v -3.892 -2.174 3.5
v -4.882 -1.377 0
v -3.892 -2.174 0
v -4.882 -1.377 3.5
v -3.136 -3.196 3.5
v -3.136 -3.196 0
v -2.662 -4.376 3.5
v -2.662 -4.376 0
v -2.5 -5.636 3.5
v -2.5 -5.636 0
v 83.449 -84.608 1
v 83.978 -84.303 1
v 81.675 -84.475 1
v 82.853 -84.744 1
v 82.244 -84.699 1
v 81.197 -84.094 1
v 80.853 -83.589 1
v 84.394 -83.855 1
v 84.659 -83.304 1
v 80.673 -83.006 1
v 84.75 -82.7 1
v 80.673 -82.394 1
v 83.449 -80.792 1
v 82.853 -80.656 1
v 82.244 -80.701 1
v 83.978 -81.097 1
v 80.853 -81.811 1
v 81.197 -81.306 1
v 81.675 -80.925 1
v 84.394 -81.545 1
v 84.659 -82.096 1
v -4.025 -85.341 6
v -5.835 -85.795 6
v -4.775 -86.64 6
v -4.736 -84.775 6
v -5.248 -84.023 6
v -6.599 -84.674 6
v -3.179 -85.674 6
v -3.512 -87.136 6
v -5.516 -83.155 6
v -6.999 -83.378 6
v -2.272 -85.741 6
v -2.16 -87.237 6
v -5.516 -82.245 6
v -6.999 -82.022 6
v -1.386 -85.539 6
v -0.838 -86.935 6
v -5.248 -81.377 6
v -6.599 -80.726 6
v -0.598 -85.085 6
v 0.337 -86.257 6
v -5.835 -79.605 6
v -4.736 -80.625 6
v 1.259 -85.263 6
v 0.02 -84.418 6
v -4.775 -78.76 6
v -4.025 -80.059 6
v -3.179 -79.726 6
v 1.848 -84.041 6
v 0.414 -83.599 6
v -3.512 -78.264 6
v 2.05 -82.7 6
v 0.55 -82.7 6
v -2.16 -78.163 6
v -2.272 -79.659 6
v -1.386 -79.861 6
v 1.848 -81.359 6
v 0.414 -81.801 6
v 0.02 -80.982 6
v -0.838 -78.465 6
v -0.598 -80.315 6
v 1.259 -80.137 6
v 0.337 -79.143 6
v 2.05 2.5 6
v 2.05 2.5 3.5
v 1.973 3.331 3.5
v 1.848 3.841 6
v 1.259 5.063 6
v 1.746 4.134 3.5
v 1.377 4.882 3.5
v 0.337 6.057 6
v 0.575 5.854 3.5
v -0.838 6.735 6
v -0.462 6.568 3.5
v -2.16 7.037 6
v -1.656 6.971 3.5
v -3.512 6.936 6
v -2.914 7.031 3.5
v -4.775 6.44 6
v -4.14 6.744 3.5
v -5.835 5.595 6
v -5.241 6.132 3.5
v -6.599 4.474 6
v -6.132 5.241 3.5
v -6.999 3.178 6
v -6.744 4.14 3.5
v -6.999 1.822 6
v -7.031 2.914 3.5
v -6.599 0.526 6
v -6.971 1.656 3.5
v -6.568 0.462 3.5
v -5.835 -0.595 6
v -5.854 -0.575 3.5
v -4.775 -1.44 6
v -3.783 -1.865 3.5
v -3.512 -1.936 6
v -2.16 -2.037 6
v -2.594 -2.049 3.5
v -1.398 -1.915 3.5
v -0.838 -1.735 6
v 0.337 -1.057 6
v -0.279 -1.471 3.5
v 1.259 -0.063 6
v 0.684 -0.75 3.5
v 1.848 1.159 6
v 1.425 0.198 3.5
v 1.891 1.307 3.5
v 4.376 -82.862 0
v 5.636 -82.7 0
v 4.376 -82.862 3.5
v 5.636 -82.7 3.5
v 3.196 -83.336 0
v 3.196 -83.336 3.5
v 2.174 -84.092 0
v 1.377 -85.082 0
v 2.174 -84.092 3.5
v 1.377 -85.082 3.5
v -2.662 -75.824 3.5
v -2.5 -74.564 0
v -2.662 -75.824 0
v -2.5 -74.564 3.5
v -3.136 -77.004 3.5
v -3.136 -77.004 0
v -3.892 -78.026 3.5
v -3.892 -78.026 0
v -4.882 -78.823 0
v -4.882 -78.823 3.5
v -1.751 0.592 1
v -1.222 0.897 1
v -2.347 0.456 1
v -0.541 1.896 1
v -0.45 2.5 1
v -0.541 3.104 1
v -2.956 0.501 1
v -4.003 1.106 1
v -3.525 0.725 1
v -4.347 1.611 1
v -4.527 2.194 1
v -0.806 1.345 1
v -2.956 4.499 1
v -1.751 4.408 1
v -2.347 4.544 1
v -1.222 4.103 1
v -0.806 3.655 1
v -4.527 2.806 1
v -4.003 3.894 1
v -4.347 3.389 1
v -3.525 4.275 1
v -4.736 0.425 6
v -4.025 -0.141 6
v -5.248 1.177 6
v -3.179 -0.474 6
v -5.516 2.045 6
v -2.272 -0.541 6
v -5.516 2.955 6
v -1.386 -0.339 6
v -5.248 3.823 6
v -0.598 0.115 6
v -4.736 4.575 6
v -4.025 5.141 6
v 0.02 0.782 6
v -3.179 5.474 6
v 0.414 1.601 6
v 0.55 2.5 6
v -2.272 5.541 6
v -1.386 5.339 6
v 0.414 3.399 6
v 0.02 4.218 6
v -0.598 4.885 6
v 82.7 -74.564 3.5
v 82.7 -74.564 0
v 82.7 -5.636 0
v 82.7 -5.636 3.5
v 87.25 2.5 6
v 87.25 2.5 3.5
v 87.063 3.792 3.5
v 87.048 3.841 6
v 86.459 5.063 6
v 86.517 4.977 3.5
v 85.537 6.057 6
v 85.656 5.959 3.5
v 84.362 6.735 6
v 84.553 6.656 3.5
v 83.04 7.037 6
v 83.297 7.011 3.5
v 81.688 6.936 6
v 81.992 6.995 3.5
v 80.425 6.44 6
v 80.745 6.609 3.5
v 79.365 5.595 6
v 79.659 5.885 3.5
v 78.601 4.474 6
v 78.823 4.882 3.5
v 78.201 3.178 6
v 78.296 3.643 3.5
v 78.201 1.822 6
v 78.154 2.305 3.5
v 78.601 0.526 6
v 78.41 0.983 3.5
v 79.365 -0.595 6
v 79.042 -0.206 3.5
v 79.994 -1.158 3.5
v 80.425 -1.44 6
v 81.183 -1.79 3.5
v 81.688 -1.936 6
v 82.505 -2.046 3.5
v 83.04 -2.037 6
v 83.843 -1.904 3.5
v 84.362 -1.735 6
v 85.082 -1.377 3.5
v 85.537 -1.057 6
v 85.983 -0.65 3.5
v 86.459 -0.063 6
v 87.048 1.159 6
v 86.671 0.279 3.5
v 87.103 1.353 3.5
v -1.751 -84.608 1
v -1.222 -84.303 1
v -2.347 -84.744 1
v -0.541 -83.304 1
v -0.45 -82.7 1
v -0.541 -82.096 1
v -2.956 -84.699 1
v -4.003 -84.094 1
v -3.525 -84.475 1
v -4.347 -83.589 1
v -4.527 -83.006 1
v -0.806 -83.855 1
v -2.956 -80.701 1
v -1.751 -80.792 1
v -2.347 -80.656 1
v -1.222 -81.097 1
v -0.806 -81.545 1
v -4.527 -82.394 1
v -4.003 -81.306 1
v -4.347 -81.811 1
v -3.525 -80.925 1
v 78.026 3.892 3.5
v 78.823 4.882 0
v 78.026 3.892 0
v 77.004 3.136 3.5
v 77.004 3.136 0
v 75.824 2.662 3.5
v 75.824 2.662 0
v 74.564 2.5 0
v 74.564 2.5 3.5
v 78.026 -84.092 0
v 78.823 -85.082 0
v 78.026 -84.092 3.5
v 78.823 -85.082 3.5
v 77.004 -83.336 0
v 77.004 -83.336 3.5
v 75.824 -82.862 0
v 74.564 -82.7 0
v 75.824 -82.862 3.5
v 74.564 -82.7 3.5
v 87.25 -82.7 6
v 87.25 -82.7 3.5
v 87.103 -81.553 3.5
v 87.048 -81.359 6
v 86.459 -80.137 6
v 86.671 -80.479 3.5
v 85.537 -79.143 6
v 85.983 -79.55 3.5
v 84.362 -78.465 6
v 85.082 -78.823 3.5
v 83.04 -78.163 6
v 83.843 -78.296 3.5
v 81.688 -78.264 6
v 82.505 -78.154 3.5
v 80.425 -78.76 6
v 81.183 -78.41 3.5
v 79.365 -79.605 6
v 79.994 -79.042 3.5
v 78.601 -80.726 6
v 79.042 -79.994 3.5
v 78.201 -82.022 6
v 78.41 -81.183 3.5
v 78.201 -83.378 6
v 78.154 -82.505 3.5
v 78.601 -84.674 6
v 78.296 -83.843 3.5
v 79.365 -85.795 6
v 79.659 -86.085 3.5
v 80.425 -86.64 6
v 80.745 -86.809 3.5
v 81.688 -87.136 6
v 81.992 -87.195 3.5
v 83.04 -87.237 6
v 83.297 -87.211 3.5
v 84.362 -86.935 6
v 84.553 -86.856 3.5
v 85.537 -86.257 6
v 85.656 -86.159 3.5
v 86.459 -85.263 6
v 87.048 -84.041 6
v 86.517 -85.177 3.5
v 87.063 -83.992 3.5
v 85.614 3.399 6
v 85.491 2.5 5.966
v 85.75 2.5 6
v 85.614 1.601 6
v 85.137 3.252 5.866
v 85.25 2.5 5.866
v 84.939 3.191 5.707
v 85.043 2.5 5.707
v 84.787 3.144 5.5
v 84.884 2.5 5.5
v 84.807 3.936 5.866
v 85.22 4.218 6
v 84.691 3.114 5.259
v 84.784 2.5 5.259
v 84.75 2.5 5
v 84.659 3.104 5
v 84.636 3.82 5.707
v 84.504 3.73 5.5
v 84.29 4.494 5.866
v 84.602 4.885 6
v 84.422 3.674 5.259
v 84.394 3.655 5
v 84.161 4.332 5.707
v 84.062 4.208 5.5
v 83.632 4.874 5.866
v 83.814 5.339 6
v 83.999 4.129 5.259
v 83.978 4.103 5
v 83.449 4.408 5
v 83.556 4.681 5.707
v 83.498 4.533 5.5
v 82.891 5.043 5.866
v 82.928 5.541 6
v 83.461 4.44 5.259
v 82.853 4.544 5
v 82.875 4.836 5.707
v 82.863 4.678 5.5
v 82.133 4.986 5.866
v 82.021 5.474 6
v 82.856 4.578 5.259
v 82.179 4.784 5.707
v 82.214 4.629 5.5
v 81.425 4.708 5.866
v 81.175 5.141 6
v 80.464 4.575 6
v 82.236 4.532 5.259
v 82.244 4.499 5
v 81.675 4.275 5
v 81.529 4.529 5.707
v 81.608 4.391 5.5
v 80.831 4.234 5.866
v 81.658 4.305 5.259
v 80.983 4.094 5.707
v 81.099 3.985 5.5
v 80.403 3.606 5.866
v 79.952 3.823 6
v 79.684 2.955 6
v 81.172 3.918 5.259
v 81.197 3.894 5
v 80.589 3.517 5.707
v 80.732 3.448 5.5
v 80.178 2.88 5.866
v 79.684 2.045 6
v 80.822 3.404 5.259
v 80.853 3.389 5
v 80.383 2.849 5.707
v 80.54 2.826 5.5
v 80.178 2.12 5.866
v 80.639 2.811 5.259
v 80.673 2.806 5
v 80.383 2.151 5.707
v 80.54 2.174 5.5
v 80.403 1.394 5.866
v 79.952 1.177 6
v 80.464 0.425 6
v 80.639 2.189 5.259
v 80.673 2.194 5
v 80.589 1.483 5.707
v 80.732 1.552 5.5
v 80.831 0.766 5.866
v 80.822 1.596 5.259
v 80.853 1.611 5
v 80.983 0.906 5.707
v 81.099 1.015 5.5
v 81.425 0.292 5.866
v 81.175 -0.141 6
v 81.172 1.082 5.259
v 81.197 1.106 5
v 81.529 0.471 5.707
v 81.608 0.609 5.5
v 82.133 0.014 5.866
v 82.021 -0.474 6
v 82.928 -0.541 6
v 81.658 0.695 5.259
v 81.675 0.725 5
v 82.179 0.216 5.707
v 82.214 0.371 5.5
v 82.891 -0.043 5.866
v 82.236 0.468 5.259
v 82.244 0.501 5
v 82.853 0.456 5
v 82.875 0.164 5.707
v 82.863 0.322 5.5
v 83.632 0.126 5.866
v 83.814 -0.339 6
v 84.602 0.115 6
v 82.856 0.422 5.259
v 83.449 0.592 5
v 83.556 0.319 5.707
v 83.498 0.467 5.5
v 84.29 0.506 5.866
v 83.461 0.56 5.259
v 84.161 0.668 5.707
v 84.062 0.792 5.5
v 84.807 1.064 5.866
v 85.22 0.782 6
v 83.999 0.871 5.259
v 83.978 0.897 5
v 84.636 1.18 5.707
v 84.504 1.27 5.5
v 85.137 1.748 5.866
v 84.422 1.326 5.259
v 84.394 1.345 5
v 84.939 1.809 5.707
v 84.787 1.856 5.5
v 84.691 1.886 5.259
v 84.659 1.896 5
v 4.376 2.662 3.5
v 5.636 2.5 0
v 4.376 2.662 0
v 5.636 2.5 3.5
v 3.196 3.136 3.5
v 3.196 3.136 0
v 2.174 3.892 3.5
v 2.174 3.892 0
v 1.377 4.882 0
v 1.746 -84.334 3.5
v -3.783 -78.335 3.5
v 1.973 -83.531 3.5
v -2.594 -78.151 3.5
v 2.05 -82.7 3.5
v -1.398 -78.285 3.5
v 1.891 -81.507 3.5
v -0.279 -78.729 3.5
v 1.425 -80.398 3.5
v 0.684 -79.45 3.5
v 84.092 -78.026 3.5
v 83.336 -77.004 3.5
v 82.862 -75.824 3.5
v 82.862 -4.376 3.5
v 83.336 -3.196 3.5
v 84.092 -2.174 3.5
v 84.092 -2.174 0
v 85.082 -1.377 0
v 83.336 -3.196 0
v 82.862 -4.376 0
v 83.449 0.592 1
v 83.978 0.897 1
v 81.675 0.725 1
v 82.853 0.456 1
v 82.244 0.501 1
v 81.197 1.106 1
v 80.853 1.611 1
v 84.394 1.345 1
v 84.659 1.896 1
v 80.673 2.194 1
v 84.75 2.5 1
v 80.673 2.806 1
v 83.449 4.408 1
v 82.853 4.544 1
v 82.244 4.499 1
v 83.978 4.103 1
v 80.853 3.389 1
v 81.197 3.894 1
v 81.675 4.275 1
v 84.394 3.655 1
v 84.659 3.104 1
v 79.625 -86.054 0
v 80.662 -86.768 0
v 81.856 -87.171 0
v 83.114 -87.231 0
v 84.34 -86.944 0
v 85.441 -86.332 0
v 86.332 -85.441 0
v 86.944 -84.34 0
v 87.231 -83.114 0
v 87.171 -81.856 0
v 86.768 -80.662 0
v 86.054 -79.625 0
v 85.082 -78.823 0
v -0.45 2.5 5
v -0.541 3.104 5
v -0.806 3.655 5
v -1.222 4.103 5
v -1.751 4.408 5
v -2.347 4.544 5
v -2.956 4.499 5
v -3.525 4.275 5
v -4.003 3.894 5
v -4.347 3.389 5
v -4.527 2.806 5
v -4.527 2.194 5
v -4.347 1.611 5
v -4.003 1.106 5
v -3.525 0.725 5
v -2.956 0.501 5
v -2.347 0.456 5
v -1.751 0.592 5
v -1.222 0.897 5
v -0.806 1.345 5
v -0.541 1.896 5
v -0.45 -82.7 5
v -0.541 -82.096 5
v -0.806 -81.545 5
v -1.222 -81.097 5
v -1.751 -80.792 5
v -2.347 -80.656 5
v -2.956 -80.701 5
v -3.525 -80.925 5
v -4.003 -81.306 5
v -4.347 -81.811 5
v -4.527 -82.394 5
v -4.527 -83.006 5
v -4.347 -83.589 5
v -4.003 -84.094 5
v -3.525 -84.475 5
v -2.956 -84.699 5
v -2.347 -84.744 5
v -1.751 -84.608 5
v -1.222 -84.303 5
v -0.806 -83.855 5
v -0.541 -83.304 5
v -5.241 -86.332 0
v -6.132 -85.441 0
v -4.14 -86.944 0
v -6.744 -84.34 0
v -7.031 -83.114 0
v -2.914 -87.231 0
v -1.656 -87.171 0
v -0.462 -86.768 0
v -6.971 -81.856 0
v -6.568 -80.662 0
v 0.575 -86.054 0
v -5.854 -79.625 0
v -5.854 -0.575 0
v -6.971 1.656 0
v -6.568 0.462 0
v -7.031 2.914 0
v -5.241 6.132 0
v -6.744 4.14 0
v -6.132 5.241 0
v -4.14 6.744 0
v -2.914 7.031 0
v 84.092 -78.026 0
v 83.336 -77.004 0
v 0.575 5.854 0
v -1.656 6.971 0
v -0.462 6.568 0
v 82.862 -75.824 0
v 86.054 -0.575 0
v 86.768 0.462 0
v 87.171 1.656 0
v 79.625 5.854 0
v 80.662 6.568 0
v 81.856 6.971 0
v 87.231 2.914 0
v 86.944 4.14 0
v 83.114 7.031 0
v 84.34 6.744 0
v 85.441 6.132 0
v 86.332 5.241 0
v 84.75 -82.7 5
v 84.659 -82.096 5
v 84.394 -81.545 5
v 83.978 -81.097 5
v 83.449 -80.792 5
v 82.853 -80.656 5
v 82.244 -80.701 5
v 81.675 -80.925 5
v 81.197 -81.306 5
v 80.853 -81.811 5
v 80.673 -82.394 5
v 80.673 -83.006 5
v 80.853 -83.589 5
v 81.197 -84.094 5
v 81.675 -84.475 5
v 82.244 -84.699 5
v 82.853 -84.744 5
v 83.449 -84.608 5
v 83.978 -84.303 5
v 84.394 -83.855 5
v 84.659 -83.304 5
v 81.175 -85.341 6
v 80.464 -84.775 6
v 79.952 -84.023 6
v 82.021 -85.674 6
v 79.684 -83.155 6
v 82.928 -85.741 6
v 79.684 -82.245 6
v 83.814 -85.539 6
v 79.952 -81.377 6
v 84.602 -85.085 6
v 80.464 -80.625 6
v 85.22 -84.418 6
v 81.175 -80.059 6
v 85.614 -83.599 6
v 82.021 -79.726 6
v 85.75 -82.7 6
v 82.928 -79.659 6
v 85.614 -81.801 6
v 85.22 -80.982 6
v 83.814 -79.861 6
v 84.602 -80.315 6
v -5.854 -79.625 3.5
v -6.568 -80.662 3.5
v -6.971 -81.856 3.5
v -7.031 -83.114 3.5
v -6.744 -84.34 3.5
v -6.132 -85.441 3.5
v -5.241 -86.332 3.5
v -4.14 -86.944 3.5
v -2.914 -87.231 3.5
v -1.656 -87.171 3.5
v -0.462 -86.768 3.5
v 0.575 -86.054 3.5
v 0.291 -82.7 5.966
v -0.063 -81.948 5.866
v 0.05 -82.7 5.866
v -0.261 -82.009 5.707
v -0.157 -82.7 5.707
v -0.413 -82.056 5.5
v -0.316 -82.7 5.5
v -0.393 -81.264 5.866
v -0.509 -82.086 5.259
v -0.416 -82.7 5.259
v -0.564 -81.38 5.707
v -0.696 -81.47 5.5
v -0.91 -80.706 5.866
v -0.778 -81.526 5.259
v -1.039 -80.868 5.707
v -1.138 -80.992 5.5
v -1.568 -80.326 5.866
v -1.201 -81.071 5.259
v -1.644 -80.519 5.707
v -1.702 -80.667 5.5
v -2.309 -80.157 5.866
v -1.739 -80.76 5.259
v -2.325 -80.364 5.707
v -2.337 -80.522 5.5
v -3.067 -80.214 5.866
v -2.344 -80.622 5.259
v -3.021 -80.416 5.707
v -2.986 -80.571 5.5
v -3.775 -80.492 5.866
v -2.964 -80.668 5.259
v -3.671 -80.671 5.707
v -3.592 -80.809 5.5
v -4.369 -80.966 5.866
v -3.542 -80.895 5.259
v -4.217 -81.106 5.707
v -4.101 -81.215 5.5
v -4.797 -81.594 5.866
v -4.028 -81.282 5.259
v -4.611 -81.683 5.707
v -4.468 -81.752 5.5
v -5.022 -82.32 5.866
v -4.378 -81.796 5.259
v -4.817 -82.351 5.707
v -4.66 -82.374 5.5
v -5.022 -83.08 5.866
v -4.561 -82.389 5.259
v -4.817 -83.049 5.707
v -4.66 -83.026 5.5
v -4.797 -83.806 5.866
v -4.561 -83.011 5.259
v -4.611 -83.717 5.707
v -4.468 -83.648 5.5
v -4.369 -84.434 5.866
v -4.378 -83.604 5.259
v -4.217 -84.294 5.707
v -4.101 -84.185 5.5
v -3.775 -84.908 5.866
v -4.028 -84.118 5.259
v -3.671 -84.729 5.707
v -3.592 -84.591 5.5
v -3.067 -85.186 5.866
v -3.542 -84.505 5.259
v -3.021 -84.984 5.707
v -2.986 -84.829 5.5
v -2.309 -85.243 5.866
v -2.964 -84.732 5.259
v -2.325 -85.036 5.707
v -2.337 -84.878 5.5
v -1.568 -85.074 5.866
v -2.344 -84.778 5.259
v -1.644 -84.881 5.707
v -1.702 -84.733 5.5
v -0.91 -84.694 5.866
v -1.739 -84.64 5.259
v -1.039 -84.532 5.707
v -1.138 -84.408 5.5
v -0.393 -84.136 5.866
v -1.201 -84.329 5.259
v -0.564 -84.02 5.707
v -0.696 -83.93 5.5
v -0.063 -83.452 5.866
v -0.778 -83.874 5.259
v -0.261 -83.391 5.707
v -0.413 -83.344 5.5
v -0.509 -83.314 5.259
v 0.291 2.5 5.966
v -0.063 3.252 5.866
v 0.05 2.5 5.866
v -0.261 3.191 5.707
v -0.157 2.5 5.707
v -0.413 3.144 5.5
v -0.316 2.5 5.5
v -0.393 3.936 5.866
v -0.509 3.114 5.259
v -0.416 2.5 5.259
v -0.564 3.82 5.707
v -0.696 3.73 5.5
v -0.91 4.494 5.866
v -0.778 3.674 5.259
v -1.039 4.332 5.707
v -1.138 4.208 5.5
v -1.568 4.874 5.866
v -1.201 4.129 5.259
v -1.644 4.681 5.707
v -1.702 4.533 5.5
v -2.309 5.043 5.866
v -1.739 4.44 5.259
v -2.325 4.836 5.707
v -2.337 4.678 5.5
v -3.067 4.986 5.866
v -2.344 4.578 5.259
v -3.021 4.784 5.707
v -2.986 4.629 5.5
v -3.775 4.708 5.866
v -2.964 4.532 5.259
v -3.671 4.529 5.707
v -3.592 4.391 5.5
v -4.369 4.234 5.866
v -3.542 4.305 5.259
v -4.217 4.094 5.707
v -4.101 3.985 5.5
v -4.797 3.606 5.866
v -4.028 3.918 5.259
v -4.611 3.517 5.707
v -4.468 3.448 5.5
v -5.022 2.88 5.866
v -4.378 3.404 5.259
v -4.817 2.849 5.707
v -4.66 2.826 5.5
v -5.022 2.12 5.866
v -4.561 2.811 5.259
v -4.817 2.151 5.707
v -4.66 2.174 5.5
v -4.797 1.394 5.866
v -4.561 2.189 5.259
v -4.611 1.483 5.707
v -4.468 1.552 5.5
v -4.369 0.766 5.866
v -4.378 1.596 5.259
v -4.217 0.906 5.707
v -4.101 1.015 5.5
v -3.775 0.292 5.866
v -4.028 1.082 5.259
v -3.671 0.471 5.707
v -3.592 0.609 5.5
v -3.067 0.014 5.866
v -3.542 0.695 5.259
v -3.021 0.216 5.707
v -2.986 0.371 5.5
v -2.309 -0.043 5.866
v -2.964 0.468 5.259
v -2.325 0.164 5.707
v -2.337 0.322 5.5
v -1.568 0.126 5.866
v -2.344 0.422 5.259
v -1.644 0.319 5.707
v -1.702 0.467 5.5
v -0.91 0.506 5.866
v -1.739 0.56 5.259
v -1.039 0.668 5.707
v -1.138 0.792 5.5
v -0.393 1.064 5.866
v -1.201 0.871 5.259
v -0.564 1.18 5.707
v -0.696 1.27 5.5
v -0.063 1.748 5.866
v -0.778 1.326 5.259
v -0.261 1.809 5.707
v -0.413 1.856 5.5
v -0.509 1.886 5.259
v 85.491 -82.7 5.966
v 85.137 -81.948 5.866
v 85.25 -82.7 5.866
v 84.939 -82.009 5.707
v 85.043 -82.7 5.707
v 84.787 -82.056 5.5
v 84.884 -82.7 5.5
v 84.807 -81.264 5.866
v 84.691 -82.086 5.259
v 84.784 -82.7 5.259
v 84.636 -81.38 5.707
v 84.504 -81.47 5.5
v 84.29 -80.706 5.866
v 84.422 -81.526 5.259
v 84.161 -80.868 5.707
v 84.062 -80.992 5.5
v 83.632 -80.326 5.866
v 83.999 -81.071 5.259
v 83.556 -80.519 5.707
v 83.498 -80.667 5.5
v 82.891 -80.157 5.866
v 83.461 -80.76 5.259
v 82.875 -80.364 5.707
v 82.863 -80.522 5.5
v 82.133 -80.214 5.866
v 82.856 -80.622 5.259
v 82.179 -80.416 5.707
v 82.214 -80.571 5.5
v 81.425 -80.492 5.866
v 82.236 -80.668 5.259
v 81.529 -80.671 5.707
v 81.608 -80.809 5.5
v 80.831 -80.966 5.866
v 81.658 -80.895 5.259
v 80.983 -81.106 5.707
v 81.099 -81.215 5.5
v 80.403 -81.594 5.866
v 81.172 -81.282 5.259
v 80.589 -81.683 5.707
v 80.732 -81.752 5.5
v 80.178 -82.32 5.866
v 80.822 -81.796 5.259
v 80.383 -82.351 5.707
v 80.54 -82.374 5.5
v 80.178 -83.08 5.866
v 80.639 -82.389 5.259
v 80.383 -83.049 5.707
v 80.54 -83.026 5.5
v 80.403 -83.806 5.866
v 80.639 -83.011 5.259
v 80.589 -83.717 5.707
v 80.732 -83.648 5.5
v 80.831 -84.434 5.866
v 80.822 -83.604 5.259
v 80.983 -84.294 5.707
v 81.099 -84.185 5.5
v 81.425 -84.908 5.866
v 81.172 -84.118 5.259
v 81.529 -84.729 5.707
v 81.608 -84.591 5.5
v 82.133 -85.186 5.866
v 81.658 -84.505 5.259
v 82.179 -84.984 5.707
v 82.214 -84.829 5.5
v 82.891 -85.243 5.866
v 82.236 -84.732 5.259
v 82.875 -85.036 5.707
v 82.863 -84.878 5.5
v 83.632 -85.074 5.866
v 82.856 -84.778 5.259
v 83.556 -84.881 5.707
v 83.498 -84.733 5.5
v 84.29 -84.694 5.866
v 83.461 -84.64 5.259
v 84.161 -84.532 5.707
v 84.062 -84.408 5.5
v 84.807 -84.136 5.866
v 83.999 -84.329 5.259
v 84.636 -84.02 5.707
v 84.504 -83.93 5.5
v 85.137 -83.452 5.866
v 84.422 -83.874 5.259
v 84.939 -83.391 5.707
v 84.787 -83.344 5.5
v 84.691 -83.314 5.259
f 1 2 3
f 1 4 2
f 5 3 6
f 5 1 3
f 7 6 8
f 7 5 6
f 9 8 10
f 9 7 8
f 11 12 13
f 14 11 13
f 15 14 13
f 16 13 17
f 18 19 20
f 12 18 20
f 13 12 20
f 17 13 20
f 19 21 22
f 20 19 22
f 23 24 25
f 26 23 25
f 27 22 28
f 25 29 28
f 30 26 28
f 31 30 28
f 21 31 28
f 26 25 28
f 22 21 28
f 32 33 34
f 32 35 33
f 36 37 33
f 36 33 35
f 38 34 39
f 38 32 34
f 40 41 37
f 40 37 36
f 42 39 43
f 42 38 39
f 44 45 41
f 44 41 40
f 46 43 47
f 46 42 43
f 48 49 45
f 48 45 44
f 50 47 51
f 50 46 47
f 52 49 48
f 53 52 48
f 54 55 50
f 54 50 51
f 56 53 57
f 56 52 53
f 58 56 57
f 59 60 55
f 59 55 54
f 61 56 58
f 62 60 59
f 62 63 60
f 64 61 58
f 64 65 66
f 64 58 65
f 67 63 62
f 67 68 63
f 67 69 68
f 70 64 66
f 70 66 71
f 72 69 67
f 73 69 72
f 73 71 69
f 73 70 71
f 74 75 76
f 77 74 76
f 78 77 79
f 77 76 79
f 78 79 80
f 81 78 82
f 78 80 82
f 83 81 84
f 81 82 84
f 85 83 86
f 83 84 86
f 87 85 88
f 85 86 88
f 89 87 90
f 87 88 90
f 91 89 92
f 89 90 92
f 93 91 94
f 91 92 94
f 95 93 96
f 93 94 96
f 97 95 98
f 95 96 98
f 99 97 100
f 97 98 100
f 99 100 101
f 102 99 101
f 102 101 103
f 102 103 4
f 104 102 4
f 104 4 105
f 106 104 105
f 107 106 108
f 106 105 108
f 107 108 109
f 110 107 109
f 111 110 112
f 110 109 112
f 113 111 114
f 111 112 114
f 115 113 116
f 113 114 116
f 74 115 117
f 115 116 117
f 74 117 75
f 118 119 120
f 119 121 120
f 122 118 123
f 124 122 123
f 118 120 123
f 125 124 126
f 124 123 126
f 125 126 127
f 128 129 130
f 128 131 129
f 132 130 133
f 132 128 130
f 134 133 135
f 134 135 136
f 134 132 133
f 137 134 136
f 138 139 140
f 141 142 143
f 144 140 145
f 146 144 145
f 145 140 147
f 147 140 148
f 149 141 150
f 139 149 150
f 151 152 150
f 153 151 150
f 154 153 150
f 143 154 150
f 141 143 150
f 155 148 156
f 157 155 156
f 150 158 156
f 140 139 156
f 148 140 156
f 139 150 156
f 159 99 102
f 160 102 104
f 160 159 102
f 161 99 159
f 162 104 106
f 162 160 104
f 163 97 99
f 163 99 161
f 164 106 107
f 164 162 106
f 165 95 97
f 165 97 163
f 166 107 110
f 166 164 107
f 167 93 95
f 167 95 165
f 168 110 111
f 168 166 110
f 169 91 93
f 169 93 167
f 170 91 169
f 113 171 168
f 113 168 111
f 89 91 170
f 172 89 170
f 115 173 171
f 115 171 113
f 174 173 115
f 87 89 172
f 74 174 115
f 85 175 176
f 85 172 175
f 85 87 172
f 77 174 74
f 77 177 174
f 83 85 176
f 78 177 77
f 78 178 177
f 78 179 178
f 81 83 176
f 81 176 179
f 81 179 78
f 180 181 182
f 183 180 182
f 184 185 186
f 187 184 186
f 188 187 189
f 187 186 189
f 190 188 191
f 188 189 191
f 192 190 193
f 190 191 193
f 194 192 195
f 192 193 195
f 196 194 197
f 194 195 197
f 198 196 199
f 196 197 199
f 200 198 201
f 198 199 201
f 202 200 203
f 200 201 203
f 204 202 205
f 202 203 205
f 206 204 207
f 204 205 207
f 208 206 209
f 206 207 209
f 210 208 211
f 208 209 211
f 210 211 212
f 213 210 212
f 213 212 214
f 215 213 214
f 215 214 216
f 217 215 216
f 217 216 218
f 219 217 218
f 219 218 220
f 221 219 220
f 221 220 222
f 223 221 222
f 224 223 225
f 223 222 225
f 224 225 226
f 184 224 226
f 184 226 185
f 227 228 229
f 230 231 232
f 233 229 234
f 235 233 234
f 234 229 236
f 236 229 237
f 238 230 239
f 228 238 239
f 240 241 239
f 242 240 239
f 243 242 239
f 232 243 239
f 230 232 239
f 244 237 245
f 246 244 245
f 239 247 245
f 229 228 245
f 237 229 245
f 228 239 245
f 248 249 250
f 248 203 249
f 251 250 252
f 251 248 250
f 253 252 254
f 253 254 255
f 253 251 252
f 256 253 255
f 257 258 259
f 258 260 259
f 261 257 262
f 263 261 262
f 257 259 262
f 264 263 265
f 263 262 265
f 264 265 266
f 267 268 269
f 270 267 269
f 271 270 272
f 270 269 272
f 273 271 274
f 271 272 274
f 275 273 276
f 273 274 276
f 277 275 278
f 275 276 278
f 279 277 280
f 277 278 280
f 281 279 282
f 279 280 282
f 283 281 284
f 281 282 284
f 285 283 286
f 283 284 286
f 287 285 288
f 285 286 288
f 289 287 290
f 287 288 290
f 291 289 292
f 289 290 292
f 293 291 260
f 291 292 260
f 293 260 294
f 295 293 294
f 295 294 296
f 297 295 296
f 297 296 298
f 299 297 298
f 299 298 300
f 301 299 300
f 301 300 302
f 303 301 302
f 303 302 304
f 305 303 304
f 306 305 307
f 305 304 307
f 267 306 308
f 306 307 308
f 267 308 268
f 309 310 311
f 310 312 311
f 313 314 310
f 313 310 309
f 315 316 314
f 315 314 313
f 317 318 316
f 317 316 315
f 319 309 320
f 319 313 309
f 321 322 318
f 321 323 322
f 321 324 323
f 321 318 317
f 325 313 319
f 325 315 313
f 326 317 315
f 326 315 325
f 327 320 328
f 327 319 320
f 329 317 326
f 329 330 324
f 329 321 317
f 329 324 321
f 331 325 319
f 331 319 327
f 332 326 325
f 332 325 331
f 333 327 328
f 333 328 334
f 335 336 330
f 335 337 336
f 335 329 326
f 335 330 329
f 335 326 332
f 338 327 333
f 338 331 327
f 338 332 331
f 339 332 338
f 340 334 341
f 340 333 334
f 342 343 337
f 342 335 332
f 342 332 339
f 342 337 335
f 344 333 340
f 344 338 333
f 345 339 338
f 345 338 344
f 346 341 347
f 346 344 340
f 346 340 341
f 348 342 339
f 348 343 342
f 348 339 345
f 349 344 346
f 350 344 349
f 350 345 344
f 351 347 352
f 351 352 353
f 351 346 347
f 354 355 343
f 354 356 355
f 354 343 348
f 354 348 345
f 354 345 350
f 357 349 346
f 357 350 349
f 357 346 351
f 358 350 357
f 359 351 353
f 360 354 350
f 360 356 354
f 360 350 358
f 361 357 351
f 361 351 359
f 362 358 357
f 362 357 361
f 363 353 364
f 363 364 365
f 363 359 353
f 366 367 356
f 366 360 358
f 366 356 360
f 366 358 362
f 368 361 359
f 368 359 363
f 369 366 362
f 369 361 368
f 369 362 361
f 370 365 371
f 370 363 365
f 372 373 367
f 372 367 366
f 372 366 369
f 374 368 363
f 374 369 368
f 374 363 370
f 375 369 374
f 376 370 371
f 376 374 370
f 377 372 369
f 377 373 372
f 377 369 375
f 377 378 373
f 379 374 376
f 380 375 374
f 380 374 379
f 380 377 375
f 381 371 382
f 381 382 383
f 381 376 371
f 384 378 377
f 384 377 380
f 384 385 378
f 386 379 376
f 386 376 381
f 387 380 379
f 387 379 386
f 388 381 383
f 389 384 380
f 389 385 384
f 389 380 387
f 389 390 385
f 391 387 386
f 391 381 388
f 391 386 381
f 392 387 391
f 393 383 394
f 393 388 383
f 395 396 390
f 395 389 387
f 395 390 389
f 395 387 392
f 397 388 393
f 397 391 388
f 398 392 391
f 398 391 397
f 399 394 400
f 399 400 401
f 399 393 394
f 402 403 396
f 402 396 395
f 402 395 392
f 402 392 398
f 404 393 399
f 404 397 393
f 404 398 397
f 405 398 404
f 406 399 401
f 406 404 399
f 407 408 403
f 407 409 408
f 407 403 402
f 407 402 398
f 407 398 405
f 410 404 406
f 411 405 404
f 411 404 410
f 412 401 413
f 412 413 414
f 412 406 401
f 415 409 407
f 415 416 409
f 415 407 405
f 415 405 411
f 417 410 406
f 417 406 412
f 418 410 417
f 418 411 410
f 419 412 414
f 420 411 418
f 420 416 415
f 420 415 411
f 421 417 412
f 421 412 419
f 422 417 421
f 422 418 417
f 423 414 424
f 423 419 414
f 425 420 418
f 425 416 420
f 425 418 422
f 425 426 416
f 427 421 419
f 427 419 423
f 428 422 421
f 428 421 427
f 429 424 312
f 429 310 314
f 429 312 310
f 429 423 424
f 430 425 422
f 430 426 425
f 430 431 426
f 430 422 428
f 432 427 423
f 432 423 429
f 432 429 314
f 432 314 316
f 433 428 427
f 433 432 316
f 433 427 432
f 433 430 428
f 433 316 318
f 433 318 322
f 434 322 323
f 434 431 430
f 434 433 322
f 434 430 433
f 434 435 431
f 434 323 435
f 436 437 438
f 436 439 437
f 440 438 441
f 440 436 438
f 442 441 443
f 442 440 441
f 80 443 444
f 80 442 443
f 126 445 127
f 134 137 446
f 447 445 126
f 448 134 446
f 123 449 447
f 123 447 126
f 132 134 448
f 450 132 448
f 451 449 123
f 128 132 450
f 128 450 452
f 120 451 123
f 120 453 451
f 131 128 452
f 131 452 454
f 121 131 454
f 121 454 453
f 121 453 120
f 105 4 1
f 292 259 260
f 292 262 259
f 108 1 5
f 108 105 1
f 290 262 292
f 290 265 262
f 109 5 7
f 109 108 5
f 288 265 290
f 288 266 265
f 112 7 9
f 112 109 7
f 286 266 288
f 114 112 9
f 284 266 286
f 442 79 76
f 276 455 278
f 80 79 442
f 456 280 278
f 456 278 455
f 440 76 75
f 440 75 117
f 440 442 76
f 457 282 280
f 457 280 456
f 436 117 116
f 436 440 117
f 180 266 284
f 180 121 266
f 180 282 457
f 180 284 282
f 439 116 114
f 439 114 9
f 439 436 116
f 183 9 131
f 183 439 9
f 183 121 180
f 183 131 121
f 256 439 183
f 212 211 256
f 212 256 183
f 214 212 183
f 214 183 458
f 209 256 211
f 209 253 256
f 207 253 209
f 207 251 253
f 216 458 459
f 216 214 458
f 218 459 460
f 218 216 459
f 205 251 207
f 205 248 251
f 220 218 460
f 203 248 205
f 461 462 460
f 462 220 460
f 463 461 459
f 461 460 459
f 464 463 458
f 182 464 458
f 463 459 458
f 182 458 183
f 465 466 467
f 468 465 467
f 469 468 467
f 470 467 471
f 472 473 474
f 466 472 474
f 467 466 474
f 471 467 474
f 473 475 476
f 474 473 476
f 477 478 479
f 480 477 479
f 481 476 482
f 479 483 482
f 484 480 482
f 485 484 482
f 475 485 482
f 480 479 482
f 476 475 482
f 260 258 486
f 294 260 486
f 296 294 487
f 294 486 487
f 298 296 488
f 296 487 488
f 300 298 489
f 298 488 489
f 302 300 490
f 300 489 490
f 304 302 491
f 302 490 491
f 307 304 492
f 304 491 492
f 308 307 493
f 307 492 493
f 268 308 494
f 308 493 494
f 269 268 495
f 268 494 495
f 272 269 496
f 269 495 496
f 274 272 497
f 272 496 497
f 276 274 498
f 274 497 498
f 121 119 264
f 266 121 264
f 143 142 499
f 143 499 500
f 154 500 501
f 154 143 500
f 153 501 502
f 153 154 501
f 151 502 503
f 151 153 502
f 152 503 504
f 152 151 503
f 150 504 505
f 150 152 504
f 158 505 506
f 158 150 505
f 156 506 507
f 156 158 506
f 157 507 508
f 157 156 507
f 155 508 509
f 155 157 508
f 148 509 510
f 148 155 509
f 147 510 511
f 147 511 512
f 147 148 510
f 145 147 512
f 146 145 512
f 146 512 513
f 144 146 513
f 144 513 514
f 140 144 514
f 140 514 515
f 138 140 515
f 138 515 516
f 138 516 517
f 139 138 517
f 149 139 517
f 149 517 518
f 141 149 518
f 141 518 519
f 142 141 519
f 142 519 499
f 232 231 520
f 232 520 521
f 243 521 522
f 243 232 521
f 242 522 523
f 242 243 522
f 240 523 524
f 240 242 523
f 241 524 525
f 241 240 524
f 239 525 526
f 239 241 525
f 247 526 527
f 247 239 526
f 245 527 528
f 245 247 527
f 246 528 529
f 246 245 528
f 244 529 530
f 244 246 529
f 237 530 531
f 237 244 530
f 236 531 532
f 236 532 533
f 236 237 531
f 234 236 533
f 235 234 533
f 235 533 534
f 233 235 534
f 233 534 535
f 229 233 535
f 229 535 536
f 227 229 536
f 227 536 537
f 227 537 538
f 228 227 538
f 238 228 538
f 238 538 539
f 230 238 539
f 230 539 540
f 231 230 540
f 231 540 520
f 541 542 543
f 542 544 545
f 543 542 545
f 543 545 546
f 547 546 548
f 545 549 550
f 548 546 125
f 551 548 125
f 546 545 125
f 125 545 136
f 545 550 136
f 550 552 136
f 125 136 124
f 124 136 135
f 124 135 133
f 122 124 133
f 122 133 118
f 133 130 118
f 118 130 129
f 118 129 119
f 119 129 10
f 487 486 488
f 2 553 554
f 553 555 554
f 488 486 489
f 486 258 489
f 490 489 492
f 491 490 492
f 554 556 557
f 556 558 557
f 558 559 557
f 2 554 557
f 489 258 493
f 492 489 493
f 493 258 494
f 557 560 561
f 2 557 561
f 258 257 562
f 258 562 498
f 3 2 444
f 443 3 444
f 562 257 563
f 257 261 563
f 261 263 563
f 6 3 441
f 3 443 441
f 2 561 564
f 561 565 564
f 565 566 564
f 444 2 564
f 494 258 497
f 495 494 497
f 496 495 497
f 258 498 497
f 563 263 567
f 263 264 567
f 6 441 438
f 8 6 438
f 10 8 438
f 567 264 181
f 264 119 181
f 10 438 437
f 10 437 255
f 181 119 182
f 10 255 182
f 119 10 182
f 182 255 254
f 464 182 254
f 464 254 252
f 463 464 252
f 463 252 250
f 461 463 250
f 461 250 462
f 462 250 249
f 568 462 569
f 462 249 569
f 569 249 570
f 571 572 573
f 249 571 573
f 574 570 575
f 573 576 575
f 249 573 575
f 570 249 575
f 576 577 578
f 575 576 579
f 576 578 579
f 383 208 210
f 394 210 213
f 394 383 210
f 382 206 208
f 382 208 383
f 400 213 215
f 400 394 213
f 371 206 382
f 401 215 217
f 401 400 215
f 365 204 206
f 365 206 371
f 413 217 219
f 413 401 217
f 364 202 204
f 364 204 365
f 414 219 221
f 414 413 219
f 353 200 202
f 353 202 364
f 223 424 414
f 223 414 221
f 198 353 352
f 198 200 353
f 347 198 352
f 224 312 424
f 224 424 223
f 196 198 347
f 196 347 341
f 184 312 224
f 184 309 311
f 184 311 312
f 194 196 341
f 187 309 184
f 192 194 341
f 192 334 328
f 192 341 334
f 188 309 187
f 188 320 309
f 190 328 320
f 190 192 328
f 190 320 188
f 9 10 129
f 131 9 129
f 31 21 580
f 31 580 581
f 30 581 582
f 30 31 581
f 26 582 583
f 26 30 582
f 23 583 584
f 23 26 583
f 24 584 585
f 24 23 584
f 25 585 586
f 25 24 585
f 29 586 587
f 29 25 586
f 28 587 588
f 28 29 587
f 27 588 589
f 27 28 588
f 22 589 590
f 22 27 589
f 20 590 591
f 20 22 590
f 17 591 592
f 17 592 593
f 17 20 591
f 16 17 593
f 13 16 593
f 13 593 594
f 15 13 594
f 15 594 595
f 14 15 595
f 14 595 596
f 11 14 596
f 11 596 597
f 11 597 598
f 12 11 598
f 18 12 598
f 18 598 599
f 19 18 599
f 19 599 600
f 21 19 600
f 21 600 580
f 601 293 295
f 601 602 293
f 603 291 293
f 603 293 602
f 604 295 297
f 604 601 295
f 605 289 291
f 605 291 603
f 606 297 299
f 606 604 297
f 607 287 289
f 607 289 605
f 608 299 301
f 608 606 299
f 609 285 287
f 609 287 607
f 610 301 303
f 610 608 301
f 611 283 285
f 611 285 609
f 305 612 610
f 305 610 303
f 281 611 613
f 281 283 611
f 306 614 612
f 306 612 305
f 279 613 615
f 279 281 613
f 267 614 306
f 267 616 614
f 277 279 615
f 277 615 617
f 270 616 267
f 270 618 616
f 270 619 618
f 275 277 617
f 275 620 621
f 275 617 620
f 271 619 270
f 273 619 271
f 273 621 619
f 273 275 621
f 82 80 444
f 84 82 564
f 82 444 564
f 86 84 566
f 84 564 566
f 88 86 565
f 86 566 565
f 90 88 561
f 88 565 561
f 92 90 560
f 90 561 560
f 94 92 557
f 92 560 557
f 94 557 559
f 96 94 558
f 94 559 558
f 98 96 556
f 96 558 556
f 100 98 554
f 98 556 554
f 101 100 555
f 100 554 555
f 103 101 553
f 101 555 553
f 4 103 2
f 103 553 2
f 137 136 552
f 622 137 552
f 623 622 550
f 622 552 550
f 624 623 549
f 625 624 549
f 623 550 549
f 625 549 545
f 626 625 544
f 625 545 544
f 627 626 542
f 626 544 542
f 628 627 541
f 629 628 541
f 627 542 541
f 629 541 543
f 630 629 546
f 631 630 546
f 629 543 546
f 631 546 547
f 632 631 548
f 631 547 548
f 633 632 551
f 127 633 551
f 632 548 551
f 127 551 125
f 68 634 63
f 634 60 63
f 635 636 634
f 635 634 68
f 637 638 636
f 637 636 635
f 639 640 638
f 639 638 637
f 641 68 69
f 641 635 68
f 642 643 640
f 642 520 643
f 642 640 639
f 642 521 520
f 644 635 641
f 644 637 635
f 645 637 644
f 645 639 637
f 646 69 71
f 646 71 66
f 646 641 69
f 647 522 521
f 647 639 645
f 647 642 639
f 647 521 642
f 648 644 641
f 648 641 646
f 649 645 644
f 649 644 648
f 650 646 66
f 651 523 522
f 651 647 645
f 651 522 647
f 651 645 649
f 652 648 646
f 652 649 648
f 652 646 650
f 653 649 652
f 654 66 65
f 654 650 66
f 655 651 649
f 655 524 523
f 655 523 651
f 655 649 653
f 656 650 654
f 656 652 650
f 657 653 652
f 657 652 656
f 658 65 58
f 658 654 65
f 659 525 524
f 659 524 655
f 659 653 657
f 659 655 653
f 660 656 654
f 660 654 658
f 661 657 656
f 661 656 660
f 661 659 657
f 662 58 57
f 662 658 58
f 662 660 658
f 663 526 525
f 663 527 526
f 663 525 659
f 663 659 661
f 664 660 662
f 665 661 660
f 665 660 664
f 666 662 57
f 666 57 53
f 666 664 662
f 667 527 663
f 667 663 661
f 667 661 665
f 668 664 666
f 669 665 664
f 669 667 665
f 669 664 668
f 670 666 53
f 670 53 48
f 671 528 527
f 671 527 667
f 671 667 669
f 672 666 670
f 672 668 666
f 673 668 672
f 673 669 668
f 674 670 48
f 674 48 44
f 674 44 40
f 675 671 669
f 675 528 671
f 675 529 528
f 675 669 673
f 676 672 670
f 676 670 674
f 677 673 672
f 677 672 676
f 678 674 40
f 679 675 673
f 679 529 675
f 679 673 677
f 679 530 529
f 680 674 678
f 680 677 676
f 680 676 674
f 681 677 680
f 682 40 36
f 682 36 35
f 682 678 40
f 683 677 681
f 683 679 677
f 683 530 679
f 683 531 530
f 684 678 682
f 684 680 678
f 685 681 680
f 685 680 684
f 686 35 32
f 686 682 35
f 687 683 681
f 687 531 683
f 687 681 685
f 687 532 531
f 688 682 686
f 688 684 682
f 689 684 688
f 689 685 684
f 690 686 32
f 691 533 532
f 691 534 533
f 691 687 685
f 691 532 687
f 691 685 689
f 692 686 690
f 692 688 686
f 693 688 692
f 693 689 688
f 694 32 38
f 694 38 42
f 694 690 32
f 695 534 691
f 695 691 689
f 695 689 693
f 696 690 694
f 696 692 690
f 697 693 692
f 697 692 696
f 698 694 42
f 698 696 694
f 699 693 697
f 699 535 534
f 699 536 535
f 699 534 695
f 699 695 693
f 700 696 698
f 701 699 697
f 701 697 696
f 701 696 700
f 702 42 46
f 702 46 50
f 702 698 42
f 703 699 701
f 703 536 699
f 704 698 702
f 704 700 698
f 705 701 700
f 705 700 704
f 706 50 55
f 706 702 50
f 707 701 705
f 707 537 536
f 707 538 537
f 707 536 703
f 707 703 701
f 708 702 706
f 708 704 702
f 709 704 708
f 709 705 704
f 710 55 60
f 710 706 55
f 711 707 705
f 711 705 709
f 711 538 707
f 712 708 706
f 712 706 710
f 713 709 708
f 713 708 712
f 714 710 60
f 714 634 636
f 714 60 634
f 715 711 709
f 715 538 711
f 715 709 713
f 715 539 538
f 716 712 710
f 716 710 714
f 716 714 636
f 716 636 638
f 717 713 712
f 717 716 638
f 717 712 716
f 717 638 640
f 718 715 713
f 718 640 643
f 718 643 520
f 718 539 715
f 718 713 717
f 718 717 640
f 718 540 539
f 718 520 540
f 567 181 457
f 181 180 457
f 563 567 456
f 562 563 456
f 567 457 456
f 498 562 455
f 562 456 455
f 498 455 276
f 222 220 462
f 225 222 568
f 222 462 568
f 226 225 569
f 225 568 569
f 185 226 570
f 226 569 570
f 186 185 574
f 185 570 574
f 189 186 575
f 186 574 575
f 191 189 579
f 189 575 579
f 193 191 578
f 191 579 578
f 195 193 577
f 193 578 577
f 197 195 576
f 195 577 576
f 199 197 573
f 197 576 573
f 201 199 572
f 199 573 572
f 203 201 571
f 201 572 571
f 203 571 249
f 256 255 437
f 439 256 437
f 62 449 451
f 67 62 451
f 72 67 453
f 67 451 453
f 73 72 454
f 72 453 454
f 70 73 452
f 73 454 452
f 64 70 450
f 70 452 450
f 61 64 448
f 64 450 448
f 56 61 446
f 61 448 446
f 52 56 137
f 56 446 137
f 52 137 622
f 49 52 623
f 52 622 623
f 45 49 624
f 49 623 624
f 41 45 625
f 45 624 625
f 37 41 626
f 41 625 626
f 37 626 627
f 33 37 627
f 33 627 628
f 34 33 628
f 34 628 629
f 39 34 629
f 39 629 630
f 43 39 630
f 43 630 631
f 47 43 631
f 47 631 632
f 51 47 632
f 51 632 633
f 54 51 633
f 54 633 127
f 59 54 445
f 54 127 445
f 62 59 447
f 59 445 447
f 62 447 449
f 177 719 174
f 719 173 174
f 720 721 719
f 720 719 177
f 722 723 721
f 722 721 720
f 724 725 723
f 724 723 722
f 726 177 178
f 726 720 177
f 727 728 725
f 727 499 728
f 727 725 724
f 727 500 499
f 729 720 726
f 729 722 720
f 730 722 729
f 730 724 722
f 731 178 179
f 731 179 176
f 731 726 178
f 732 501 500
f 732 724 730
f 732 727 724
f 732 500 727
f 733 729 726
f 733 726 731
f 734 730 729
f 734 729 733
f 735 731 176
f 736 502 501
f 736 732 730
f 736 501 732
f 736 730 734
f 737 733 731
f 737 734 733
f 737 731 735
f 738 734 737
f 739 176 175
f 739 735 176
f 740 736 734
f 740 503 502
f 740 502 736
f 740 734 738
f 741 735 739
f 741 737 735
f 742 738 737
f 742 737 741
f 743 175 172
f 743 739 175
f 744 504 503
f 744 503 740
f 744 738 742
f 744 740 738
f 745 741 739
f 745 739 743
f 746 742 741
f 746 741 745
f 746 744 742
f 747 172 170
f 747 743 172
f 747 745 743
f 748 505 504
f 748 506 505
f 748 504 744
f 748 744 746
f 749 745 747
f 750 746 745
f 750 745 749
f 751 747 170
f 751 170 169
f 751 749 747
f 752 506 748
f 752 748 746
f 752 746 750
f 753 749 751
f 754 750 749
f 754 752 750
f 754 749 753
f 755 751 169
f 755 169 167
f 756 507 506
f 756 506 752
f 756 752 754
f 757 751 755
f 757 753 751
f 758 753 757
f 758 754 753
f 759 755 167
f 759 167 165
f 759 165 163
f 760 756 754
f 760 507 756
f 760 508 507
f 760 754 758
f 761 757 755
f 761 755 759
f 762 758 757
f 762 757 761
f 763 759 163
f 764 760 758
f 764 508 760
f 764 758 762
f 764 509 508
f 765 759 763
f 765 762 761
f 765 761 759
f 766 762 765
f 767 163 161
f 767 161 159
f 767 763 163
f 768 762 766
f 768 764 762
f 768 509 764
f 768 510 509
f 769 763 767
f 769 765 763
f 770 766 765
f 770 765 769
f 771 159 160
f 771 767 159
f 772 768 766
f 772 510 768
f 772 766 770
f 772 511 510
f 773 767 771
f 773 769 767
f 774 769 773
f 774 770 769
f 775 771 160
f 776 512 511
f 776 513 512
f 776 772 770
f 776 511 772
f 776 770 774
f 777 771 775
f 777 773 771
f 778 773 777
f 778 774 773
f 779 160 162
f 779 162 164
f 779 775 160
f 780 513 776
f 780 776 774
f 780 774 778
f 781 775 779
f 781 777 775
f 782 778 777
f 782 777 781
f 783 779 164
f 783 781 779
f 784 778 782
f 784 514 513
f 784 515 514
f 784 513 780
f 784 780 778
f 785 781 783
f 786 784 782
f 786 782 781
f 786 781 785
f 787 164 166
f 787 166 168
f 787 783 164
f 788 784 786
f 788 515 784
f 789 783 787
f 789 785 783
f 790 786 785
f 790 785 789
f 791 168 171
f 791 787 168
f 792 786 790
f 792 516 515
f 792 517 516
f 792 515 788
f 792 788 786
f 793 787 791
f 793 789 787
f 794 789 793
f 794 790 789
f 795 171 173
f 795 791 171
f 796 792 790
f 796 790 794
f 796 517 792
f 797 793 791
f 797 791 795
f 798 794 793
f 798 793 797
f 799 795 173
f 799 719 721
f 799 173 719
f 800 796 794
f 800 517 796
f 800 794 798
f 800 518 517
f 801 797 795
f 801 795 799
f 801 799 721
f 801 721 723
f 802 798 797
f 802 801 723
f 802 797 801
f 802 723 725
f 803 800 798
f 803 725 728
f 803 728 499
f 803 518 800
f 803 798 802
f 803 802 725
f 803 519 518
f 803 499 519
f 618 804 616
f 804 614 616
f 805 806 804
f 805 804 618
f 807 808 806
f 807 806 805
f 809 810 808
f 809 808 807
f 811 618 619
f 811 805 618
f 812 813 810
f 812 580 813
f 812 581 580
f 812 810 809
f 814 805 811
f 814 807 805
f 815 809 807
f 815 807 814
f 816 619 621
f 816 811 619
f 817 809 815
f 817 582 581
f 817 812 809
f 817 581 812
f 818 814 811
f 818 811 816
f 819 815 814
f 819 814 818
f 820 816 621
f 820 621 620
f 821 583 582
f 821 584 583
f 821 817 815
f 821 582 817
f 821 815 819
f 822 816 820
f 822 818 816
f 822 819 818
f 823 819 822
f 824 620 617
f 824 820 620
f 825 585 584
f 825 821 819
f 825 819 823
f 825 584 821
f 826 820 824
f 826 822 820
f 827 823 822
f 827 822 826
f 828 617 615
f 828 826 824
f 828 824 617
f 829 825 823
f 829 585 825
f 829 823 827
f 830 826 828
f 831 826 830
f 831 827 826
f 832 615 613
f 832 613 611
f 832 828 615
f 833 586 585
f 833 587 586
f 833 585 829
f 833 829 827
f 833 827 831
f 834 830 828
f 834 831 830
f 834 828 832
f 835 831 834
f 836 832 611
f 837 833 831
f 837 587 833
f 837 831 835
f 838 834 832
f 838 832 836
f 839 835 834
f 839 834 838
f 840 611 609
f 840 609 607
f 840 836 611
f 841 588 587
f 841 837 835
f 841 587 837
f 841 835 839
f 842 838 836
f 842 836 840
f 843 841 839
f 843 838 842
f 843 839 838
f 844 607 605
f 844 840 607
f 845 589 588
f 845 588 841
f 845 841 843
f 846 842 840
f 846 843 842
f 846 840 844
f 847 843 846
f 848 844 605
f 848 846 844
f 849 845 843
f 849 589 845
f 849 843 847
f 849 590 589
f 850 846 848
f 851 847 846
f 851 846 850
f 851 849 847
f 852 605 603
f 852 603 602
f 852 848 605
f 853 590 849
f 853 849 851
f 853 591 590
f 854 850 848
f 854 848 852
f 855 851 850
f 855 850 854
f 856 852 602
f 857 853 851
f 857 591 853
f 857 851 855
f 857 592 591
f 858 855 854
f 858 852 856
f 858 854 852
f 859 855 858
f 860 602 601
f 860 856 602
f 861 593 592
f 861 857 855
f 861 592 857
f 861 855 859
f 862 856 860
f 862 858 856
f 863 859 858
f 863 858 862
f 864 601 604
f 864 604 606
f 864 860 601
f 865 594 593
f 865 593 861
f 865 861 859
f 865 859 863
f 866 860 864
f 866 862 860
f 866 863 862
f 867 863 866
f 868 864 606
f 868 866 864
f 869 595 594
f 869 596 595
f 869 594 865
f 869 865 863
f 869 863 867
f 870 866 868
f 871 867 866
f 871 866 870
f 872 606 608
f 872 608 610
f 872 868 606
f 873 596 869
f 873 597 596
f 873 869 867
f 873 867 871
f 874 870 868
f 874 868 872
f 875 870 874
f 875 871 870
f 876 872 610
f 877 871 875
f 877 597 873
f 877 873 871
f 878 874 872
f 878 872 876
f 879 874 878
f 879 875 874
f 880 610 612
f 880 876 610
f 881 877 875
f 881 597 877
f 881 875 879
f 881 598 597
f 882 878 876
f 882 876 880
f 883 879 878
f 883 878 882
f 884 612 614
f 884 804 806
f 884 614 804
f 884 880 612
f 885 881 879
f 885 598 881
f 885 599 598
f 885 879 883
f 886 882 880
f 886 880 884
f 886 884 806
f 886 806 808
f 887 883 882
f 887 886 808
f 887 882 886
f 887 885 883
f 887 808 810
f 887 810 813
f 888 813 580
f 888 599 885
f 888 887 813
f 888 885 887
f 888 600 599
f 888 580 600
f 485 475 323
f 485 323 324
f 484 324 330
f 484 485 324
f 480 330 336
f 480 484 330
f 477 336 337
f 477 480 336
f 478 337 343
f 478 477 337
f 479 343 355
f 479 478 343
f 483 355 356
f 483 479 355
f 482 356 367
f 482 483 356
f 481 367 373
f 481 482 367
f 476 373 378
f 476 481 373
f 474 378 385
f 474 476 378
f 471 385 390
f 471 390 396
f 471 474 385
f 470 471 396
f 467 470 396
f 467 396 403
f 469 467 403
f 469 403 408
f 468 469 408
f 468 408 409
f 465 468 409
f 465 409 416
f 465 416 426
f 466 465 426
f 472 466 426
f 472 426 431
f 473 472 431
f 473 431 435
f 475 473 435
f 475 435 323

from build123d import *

# Parameters (mm, degrees)
SKETCH1_R           = 2.05
BOSS_EXTRUDE1_DEPTH = 3.5
FILLET1_R           = 5
SKETCH2_R           = 4.55
BOSS_EXTRUDE2_DEPTH = 1
SKETCH3_R           = 4.55
SKETCH3_R_2         = 2.05
BOSS_EXTRUDE3_DEPTH = 2.5
FILLET2_R           = 1


with BuildPart() as part:
    # Sketch1 → Boss-Extrude1 (new body)
    with BuildSketch(Plane.XY):
        with BuildLine():
            ThreePointArc((82.7, -2.05), (85.917335854, 5.717335854), (78.15, 2.5))
            Line((78.15, 2.5), (2.05, 2.5))
            ThreePointArc((2.05, 2.5), (-5.717335854, 5.717335854), (-2.5, -2.05))
            Line((-2.5, -2.05), (-2.5, -78.15))
            ThreePointArc((-2.5, -78.15), (-5.717335854, -85.917335854), (2.05, -82.7))
            Line((2.05, -82.7), (78.15, -82.7))
            ThreePointArc((78.15, -82.7), (85.917335854, -85.917335854), (82.7, -78.15))
            Line((82.7, -78.15), (82.7, -2.05))
        make_face()
        with Locations((82.7, -82.7)):
            Circle(SKETCH1_R, mode=Mode.SUBTRACT)
        with Locations((-2.5, -82.7)):
            Circle(SKETCH1_R, mode=Mode.SUBTRACT)
        with Locations((82.7, 2.5)):
            Circle(SKETCH1_R, mode=Mode.SUBTRACT)
        with Locations((-2.5, 2.5)):
            Circle(SKETCH1_R, mode=Mode.SUBTRACT)
    extrude(amount=BOSS_EXTRUDE1_DEPTH)

    # Fillet1
    fillet1_edges = [part.edges().sort_by_distance(p)[0] for p in [
        (2.05, 2.5, 1.75),
        (78.15, 2.5, 1.75),
        (82.7, -2.05, 1.75),
        (82.7, -78.15, 1.75),
        (78.15, -82.7, 1.75),
        (2.05, -82.7, 1.75),
        (-2.5, -78.15, 1.75),
        (-2.5, -2.05, 1.75),
    ]]
    fillet(fillet1_edges, radius=FILLET1_R)

    # Sketch2 → Boss-Extrude2 (add)
    with BuildSketch(Plane(origin=(0, 0, 0), x_dir=(-1, 0, 0), z_dir=(0, 0, -1))):
        with Locations((-82.7, 2.5)):
            Circle(SKETCH2_R)
        with Locations((2.5, 2.5)):
            Circle(SKETCH2_R)
        with Locations((2.5, -82.7)):
            Circle(SKETCH2_R)
        with Locations((-82.7, -82.7)):
            Circle(SKETCH2_R)
    extrude(amount=-BOSS_EXTRUDE2_DEPTH)

    # Sketch3 → Boss-Extrude3 (add)
    with BuildSketch(Plane.XY.offset(3.5)):
        with Locations((-2.5, 2.5)):
            Circle(SKETCH3_R)
        with Locations((-2.5, 2.5)):
            Circle(SKETCH3_R_2, mode=Mode.SUBTRACT)
        with Locations((82.7, 2.5)):
            Circle(SKETCH3_R)
        with Locations((82.7, 2.5)):
            Circle(SKETCH3_R_2, mode=Mode.SUBTRACT)
        with Locations((82.7, -82.7)):
            Circle(SKETCH3_R)
        with Locations((82.7, -82.7)):
            Circle(SKETCH3_R_2, mode=Mode.SUBTRACT)
        with Locations((-2.5, -82.7)):
            Circle(SKETCH3_R)
        with Locations((-2.5, -82.7)):
            Circle(SKETCH3_R_2, mode=Mode.SUBTRACT)
    extrude(amount=BOSS_EXTRUDE3_DEPTH)

    # Fillet2
    fillet2_edges = [part.edges().sort_by_distance(p)[0] for p in [
        (-4.55, 2.5, 6),
        (80.65, 2.5, 6),
        (80.65, -82.7, 6),
        (-4.55, -82.7, 6),
    ]]
    fillet(fillet2_edges, radius=FILLET2_R)


solid = part.part
